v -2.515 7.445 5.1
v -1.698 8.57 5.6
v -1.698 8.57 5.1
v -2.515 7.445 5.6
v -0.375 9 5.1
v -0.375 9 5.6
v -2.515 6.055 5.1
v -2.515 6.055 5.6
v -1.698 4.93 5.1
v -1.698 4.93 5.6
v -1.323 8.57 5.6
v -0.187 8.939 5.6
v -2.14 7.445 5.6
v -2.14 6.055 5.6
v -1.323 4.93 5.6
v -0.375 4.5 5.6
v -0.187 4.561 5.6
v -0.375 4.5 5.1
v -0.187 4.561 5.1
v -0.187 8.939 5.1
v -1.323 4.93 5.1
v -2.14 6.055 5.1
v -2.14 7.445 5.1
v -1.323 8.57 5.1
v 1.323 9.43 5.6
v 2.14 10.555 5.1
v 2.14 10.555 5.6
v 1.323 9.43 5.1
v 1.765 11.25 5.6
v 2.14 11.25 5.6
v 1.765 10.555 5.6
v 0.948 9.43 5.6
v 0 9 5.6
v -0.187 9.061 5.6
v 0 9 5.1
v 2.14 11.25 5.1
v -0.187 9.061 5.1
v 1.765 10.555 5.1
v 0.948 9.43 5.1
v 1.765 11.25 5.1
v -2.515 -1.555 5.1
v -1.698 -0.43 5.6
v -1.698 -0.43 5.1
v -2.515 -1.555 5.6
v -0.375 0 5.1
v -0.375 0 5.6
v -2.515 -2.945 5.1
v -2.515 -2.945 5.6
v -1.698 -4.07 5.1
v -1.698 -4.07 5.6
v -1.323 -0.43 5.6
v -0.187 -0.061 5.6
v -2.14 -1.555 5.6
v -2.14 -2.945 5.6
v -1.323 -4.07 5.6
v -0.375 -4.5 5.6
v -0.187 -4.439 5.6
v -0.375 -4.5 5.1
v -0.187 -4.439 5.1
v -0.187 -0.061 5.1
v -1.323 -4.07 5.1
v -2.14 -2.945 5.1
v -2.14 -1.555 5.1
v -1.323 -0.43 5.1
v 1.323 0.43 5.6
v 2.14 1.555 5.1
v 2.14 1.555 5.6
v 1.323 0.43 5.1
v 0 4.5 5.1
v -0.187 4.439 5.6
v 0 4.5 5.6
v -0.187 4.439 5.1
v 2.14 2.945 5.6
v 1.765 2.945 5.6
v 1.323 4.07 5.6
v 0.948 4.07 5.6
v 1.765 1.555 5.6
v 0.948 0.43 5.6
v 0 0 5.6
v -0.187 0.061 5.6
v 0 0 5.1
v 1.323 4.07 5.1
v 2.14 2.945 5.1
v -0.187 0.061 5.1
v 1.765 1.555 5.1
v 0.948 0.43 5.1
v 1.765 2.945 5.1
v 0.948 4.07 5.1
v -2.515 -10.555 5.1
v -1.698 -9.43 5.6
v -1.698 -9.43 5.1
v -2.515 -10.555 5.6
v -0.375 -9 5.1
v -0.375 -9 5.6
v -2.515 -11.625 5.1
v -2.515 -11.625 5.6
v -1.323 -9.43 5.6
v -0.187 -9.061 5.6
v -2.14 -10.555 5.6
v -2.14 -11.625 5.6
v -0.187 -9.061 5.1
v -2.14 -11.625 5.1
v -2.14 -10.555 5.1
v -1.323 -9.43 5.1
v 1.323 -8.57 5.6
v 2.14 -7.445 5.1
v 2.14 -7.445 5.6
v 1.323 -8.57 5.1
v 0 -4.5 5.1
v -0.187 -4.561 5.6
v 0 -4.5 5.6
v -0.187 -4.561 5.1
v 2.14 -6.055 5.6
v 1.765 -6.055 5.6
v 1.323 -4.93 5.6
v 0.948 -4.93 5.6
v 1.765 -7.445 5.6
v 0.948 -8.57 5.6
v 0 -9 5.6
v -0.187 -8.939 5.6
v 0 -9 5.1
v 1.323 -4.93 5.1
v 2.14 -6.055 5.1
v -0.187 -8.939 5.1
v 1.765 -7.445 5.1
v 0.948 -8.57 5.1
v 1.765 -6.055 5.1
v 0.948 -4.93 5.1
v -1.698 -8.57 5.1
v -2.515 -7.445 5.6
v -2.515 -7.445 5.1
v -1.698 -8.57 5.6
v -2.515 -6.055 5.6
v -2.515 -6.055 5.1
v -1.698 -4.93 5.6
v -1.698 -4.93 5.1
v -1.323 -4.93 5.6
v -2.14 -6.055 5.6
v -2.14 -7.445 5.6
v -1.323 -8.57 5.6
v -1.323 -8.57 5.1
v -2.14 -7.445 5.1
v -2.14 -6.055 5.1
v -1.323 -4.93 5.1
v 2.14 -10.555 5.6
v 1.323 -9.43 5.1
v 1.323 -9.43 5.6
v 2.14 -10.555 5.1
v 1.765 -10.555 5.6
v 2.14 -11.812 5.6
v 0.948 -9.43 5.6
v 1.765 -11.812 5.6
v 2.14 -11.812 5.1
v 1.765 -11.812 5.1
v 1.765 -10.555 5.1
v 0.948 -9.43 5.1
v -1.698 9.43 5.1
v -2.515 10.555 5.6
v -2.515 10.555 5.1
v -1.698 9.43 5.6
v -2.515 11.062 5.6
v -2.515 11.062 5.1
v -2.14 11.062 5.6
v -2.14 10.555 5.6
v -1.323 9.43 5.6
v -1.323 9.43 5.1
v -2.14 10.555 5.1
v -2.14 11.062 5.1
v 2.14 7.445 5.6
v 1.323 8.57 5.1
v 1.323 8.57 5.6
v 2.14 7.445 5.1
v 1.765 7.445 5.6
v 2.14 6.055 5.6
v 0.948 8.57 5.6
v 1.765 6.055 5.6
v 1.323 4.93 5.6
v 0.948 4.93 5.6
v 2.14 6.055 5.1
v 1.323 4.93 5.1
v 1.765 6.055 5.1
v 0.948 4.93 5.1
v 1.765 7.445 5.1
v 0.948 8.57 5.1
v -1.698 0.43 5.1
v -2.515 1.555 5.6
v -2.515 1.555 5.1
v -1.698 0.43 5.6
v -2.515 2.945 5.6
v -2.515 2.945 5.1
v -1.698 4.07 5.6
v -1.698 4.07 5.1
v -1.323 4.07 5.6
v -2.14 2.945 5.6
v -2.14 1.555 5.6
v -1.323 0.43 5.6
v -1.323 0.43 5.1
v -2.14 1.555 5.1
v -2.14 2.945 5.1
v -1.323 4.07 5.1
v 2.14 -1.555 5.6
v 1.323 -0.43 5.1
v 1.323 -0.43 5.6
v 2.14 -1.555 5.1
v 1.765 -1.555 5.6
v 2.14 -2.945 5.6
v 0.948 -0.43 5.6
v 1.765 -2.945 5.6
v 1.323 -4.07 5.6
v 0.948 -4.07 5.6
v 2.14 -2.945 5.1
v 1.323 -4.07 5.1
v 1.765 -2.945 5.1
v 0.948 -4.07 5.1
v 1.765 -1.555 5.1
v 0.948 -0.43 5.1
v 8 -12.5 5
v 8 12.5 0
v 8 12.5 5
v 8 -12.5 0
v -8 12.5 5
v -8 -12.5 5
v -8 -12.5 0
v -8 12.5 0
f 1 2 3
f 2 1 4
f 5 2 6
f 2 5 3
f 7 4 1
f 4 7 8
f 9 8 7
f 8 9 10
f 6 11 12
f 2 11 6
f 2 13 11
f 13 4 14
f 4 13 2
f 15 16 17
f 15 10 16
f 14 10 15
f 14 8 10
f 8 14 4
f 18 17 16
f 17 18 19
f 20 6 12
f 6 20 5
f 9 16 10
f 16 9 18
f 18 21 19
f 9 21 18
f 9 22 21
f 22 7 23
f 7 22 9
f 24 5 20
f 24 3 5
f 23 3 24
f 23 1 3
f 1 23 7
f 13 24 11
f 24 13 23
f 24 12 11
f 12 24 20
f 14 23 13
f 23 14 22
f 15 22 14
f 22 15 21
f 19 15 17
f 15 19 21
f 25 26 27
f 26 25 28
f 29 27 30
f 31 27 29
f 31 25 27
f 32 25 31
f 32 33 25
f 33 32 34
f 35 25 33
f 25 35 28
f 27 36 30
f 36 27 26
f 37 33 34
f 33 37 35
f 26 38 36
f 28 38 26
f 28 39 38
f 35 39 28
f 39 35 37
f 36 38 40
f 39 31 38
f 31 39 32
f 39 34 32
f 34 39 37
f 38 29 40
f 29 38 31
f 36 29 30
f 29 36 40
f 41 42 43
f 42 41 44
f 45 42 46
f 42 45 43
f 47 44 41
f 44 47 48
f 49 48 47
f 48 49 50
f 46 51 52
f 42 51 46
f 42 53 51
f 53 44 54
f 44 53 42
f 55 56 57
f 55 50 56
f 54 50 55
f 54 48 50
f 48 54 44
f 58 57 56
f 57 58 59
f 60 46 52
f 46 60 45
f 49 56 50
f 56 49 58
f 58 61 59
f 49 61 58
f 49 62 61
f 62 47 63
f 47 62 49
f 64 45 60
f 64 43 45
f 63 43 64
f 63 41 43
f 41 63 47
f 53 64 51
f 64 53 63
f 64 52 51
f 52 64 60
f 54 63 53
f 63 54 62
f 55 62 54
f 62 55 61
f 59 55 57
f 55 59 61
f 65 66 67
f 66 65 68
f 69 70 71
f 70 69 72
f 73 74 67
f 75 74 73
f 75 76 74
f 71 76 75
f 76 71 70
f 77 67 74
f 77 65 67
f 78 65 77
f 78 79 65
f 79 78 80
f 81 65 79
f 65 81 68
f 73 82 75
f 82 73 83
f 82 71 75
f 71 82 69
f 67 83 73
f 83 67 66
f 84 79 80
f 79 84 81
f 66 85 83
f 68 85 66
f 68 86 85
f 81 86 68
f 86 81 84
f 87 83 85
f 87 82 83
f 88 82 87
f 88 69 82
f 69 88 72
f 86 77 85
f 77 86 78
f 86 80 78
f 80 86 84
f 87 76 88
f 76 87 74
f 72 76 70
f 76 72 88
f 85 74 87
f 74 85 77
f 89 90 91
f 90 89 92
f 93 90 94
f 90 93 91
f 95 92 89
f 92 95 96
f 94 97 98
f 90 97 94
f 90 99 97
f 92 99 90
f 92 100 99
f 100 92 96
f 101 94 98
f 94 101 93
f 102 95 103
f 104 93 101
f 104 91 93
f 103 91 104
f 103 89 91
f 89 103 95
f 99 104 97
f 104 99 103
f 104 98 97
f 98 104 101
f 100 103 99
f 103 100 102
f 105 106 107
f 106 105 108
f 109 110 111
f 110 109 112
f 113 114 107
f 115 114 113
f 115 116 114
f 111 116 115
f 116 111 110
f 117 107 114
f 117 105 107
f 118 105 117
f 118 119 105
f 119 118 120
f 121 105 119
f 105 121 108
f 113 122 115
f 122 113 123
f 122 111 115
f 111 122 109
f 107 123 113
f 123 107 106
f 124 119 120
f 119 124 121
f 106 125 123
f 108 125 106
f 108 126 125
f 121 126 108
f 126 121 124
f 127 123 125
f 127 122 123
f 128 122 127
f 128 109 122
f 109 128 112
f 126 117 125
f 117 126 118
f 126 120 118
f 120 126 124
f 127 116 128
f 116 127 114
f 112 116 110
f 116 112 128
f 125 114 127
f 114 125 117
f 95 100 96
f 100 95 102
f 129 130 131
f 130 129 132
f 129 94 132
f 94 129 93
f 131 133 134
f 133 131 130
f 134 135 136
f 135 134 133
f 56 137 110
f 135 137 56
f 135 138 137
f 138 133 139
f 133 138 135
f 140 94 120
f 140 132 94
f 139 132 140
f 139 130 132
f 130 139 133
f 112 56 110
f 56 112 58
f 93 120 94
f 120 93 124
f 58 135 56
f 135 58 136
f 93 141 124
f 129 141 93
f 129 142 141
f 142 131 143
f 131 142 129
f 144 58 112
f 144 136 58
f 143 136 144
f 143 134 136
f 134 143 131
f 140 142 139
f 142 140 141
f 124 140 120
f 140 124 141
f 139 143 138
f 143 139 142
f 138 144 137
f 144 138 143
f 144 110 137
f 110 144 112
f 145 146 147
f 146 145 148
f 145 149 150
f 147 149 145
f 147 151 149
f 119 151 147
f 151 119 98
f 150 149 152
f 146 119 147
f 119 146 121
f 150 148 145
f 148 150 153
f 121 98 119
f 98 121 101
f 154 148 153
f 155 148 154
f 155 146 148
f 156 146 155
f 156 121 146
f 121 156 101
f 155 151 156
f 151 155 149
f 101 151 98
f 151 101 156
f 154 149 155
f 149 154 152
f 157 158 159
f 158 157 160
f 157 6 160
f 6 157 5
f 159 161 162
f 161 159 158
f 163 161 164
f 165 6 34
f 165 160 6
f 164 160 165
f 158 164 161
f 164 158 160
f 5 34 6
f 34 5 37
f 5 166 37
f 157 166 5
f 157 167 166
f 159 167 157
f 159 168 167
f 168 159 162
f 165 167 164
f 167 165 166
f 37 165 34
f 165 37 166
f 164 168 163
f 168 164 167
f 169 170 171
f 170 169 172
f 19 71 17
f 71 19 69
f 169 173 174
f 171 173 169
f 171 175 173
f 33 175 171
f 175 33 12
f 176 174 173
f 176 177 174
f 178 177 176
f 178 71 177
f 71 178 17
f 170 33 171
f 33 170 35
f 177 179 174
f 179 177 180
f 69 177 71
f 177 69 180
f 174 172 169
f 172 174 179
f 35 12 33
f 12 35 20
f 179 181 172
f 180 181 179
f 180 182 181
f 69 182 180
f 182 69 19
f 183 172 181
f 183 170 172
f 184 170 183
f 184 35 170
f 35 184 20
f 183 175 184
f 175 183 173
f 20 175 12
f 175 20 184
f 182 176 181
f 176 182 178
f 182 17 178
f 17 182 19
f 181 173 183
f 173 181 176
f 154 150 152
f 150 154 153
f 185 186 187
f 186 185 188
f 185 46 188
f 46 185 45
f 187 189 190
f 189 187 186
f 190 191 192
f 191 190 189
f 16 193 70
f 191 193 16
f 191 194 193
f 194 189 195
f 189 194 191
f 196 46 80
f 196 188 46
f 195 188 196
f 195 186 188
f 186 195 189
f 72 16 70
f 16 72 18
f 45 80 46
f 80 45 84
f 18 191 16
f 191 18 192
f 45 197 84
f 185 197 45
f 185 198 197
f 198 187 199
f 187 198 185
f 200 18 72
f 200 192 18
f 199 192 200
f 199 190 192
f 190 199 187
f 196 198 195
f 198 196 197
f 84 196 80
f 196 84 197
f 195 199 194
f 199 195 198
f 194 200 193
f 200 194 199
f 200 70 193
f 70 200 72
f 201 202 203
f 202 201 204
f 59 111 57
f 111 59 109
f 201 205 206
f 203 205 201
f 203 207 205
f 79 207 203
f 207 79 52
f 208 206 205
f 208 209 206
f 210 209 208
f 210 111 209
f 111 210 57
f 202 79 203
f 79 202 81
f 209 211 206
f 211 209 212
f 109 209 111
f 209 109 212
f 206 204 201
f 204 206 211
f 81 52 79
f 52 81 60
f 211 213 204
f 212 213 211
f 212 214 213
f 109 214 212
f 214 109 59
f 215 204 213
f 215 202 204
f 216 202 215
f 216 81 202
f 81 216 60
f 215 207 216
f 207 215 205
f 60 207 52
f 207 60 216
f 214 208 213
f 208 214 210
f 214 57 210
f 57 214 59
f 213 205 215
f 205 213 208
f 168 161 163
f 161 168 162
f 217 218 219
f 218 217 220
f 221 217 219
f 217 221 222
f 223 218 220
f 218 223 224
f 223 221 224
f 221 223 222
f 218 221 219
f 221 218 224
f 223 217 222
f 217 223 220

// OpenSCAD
// file: common.scad
module arrow() {
    union() {
        translate([-3,-1.5,0]) cube([4,3,0.5]);
        translate([2.5,0,0]) cylinder(0.5,3,3,$fn=3);
    }
}

module _wave_s() {
    difference() {
        translate([0,2.5,0]) cylinder(0.5,3,3);
        translate([0,2,-10]) cylinder(30,3,3);
    }
    translate([6,0,0]) difference() {
        translate([0,2,0]) cylinder(0.5,3,3);
        translate([0,2.5,-10]) cylinder(30,3,3);
    }
}

module wave() {
    $wave_scale = 0.75;
    scale([$wave_scale, $wave_scale, 1]) translate([0,-2,0]) {
        difference() {
            translate([9,0,0]) _wave_s();
            translate([15,-3,-1]) cube([6,10,2.5]);
        }
        translate([-3,0,0]) _wave_s();
        difference() {
            translate([-15,0,0]) _wave_s();
            translate([-21.5,-3,-1]) cube([6,10,2.5]);
        }
        
        mirror([-1,0,0]) {
            difference() {
                translate([9,0,0]) _wave_s();
                translate([15.75,-3,-1]) cube([6,10,2.5]);
            }
            translate([-3,0,0]) _wave_s();
            difference() {
                translate([-15,0,0]) _wave_s();
                translate([-20.75,-3,-1]) cube([6,10,2.5]);
            }
        }
    }
}
// main file
use <common.scad>;

color([0,0.75,1]) translate([-8,-12.5,0]) cube([16,25,5]);

color([1,1,1]) rotate(90) translate([0,0,5.1]) wave();
